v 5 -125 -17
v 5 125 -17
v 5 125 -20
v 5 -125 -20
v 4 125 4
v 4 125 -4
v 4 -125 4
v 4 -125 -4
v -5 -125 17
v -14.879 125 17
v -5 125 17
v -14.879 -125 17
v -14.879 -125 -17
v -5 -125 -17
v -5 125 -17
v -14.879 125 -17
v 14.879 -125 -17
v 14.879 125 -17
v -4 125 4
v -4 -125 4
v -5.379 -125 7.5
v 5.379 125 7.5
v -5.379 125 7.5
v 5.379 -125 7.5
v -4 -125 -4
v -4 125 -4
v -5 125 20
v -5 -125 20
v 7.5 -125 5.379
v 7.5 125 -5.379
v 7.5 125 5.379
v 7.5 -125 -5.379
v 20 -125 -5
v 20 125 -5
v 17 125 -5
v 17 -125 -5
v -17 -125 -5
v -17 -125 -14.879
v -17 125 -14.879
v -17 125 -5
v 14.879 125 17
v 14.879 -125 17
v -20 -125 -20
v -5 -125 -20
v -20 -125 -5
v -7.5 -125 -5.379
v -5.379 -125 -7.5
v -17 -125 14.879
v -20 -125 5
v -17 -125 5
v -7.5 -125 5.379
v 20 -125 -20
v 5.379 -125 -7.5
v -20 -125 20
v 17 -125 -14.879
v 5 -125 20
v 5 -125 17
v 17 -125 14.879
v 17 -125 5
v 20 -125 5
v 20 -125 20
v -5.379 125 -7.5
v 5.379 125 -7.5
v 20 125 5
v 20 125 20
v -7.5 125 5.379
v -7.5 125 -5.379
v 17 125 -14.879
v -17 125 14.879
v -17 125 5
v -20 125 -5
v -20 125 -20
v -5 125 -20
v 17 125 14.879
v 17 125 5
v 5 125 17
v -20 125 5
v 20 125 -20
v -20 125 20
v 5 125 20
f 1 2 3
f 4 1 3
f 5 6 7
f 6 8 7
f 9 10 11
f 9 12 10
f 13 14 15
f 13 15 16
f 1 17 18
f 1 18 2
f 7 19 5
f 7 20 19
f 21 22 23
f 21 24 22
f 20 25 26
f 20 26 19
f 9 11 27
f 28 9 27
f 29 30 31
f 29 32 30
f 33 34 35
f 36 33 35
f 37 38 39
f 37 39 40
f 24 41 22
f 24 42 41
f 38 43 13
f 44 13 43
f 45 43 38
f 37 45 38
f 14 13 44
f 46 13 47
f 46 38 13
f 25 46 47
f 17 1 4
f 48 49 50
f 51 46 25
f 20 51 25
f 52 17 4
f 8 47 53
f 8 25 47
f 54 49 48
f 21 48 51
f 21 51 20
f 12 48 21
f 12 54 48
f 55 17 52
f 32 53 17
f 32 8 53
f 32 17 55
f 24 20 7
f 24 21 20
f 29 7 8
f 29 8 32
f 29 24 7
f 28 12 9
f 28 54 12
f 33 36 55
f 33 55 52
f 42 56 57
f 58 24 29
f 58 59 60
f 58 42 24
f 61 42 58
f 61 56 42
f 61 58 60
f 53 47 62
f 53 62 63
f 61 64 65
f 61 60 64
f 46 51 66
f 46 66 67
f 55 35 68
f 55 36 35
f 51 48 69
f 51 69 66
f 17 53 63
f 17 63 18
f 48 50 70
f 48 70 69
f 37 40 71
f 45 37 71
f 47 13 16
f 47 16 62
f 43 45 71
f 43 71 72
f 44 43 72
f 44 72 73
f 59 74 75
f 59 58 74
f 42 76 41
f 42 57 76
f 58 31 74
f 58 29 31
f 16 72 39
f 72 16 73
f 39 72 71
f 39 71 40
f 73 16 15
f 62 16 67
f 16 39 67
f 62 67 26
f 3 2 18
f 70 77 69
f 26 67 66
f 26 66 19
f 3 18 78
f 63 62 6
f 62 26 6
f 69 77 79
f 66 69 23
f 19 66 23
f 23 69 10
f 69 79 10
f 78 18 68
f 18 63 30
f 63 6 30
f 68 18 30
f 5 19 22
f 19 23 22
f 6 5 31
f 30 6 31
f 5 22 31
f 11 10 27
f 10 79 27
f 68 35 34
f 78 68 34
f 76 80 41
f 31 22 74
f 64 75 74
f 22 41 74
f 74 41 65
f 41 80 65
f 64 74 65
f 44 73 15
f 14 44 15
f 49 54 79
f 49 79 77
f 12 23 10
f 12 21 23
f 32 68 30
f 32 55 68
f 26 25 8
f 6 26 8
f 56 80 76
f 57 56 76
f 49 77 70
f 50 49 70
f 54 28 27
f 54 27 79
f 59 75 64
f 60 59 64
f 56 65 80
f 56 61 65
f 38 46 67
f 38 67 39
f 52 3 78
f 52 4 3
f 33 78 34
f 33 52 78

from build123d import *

# Parameters (mm, degrees)
F0_W     = 8
F0_H     = 8
F1_DEPTH = 125


with BuildPart() as f1:
    # F0 (on Front) → F1 (new body, symmetric)
    with BuildSketch(Plane.XZ):
        Polygon((-5, 17), (-5, 20), (-20, 20), (-20, 5), (-17, 5), (-17, 14.87868), (-17, 17), (-14.87868, 17), align=None)
        Polygon((-17, -5), (-20, -5), (-20, -20), (-5, -20), (-5, -17), (-14.87868, -17), (-17, -17), (-17, -14.87868), align=None)
        Polygon((20, -20), (20, -5), (17, -5), (17, -14.87868), (17, -17), (14.87868, -17), (5, -17), (5, -20), align=None)
        Polygon((20, 5), (20, 20), (5, 20), (5, 17), (14.87868, 17), (17, 17), (17, 14.87868), (17, 5), align=None)
        Polygon((17, 17), (14.87868, 17), (5.37868, 7.5), (7.5, 7.5), (7.5, 5.37868), (17, 14.87868), align=None)
        Polygon((-5.37868, 7.5), (-14.87868, 17), (-17, 17), (-17, 14.87868), (-7.5, 5.37868), (-7.5, 7.5), align=None)
        Polygon((-7.5, -5.37868), (-17, -14.87868), (-17, -17), (-14.87868, -17), (-5.37868, -7.5), (-7.5, -7.5), align=None)
        Polygon((17, -17), (17, -14.87868), (7.5, -5.37868), (7.5, -7.5), (5.37868, -7.5), (14.87868, -17), align=None)
        Polygon((7.5, 7.5), (5.37868, 7.5), (-5.37868, 7.5), (-7.5, 7.5), (-7.5, 5.37868), (-7.5, -5.37868), (-7.5, -7.5), (-5.37868, -7.5), (5.37868, -7.5), (7.5, -7.5), (7.5, -5.37868), (7.5, 5.37868), align=None)
        Rectangle(F0_W, F0_H, mode=Mode.SUBTRACT)
    extrude(amount=F1_DEPTH, both=True)


solid = f1.part
